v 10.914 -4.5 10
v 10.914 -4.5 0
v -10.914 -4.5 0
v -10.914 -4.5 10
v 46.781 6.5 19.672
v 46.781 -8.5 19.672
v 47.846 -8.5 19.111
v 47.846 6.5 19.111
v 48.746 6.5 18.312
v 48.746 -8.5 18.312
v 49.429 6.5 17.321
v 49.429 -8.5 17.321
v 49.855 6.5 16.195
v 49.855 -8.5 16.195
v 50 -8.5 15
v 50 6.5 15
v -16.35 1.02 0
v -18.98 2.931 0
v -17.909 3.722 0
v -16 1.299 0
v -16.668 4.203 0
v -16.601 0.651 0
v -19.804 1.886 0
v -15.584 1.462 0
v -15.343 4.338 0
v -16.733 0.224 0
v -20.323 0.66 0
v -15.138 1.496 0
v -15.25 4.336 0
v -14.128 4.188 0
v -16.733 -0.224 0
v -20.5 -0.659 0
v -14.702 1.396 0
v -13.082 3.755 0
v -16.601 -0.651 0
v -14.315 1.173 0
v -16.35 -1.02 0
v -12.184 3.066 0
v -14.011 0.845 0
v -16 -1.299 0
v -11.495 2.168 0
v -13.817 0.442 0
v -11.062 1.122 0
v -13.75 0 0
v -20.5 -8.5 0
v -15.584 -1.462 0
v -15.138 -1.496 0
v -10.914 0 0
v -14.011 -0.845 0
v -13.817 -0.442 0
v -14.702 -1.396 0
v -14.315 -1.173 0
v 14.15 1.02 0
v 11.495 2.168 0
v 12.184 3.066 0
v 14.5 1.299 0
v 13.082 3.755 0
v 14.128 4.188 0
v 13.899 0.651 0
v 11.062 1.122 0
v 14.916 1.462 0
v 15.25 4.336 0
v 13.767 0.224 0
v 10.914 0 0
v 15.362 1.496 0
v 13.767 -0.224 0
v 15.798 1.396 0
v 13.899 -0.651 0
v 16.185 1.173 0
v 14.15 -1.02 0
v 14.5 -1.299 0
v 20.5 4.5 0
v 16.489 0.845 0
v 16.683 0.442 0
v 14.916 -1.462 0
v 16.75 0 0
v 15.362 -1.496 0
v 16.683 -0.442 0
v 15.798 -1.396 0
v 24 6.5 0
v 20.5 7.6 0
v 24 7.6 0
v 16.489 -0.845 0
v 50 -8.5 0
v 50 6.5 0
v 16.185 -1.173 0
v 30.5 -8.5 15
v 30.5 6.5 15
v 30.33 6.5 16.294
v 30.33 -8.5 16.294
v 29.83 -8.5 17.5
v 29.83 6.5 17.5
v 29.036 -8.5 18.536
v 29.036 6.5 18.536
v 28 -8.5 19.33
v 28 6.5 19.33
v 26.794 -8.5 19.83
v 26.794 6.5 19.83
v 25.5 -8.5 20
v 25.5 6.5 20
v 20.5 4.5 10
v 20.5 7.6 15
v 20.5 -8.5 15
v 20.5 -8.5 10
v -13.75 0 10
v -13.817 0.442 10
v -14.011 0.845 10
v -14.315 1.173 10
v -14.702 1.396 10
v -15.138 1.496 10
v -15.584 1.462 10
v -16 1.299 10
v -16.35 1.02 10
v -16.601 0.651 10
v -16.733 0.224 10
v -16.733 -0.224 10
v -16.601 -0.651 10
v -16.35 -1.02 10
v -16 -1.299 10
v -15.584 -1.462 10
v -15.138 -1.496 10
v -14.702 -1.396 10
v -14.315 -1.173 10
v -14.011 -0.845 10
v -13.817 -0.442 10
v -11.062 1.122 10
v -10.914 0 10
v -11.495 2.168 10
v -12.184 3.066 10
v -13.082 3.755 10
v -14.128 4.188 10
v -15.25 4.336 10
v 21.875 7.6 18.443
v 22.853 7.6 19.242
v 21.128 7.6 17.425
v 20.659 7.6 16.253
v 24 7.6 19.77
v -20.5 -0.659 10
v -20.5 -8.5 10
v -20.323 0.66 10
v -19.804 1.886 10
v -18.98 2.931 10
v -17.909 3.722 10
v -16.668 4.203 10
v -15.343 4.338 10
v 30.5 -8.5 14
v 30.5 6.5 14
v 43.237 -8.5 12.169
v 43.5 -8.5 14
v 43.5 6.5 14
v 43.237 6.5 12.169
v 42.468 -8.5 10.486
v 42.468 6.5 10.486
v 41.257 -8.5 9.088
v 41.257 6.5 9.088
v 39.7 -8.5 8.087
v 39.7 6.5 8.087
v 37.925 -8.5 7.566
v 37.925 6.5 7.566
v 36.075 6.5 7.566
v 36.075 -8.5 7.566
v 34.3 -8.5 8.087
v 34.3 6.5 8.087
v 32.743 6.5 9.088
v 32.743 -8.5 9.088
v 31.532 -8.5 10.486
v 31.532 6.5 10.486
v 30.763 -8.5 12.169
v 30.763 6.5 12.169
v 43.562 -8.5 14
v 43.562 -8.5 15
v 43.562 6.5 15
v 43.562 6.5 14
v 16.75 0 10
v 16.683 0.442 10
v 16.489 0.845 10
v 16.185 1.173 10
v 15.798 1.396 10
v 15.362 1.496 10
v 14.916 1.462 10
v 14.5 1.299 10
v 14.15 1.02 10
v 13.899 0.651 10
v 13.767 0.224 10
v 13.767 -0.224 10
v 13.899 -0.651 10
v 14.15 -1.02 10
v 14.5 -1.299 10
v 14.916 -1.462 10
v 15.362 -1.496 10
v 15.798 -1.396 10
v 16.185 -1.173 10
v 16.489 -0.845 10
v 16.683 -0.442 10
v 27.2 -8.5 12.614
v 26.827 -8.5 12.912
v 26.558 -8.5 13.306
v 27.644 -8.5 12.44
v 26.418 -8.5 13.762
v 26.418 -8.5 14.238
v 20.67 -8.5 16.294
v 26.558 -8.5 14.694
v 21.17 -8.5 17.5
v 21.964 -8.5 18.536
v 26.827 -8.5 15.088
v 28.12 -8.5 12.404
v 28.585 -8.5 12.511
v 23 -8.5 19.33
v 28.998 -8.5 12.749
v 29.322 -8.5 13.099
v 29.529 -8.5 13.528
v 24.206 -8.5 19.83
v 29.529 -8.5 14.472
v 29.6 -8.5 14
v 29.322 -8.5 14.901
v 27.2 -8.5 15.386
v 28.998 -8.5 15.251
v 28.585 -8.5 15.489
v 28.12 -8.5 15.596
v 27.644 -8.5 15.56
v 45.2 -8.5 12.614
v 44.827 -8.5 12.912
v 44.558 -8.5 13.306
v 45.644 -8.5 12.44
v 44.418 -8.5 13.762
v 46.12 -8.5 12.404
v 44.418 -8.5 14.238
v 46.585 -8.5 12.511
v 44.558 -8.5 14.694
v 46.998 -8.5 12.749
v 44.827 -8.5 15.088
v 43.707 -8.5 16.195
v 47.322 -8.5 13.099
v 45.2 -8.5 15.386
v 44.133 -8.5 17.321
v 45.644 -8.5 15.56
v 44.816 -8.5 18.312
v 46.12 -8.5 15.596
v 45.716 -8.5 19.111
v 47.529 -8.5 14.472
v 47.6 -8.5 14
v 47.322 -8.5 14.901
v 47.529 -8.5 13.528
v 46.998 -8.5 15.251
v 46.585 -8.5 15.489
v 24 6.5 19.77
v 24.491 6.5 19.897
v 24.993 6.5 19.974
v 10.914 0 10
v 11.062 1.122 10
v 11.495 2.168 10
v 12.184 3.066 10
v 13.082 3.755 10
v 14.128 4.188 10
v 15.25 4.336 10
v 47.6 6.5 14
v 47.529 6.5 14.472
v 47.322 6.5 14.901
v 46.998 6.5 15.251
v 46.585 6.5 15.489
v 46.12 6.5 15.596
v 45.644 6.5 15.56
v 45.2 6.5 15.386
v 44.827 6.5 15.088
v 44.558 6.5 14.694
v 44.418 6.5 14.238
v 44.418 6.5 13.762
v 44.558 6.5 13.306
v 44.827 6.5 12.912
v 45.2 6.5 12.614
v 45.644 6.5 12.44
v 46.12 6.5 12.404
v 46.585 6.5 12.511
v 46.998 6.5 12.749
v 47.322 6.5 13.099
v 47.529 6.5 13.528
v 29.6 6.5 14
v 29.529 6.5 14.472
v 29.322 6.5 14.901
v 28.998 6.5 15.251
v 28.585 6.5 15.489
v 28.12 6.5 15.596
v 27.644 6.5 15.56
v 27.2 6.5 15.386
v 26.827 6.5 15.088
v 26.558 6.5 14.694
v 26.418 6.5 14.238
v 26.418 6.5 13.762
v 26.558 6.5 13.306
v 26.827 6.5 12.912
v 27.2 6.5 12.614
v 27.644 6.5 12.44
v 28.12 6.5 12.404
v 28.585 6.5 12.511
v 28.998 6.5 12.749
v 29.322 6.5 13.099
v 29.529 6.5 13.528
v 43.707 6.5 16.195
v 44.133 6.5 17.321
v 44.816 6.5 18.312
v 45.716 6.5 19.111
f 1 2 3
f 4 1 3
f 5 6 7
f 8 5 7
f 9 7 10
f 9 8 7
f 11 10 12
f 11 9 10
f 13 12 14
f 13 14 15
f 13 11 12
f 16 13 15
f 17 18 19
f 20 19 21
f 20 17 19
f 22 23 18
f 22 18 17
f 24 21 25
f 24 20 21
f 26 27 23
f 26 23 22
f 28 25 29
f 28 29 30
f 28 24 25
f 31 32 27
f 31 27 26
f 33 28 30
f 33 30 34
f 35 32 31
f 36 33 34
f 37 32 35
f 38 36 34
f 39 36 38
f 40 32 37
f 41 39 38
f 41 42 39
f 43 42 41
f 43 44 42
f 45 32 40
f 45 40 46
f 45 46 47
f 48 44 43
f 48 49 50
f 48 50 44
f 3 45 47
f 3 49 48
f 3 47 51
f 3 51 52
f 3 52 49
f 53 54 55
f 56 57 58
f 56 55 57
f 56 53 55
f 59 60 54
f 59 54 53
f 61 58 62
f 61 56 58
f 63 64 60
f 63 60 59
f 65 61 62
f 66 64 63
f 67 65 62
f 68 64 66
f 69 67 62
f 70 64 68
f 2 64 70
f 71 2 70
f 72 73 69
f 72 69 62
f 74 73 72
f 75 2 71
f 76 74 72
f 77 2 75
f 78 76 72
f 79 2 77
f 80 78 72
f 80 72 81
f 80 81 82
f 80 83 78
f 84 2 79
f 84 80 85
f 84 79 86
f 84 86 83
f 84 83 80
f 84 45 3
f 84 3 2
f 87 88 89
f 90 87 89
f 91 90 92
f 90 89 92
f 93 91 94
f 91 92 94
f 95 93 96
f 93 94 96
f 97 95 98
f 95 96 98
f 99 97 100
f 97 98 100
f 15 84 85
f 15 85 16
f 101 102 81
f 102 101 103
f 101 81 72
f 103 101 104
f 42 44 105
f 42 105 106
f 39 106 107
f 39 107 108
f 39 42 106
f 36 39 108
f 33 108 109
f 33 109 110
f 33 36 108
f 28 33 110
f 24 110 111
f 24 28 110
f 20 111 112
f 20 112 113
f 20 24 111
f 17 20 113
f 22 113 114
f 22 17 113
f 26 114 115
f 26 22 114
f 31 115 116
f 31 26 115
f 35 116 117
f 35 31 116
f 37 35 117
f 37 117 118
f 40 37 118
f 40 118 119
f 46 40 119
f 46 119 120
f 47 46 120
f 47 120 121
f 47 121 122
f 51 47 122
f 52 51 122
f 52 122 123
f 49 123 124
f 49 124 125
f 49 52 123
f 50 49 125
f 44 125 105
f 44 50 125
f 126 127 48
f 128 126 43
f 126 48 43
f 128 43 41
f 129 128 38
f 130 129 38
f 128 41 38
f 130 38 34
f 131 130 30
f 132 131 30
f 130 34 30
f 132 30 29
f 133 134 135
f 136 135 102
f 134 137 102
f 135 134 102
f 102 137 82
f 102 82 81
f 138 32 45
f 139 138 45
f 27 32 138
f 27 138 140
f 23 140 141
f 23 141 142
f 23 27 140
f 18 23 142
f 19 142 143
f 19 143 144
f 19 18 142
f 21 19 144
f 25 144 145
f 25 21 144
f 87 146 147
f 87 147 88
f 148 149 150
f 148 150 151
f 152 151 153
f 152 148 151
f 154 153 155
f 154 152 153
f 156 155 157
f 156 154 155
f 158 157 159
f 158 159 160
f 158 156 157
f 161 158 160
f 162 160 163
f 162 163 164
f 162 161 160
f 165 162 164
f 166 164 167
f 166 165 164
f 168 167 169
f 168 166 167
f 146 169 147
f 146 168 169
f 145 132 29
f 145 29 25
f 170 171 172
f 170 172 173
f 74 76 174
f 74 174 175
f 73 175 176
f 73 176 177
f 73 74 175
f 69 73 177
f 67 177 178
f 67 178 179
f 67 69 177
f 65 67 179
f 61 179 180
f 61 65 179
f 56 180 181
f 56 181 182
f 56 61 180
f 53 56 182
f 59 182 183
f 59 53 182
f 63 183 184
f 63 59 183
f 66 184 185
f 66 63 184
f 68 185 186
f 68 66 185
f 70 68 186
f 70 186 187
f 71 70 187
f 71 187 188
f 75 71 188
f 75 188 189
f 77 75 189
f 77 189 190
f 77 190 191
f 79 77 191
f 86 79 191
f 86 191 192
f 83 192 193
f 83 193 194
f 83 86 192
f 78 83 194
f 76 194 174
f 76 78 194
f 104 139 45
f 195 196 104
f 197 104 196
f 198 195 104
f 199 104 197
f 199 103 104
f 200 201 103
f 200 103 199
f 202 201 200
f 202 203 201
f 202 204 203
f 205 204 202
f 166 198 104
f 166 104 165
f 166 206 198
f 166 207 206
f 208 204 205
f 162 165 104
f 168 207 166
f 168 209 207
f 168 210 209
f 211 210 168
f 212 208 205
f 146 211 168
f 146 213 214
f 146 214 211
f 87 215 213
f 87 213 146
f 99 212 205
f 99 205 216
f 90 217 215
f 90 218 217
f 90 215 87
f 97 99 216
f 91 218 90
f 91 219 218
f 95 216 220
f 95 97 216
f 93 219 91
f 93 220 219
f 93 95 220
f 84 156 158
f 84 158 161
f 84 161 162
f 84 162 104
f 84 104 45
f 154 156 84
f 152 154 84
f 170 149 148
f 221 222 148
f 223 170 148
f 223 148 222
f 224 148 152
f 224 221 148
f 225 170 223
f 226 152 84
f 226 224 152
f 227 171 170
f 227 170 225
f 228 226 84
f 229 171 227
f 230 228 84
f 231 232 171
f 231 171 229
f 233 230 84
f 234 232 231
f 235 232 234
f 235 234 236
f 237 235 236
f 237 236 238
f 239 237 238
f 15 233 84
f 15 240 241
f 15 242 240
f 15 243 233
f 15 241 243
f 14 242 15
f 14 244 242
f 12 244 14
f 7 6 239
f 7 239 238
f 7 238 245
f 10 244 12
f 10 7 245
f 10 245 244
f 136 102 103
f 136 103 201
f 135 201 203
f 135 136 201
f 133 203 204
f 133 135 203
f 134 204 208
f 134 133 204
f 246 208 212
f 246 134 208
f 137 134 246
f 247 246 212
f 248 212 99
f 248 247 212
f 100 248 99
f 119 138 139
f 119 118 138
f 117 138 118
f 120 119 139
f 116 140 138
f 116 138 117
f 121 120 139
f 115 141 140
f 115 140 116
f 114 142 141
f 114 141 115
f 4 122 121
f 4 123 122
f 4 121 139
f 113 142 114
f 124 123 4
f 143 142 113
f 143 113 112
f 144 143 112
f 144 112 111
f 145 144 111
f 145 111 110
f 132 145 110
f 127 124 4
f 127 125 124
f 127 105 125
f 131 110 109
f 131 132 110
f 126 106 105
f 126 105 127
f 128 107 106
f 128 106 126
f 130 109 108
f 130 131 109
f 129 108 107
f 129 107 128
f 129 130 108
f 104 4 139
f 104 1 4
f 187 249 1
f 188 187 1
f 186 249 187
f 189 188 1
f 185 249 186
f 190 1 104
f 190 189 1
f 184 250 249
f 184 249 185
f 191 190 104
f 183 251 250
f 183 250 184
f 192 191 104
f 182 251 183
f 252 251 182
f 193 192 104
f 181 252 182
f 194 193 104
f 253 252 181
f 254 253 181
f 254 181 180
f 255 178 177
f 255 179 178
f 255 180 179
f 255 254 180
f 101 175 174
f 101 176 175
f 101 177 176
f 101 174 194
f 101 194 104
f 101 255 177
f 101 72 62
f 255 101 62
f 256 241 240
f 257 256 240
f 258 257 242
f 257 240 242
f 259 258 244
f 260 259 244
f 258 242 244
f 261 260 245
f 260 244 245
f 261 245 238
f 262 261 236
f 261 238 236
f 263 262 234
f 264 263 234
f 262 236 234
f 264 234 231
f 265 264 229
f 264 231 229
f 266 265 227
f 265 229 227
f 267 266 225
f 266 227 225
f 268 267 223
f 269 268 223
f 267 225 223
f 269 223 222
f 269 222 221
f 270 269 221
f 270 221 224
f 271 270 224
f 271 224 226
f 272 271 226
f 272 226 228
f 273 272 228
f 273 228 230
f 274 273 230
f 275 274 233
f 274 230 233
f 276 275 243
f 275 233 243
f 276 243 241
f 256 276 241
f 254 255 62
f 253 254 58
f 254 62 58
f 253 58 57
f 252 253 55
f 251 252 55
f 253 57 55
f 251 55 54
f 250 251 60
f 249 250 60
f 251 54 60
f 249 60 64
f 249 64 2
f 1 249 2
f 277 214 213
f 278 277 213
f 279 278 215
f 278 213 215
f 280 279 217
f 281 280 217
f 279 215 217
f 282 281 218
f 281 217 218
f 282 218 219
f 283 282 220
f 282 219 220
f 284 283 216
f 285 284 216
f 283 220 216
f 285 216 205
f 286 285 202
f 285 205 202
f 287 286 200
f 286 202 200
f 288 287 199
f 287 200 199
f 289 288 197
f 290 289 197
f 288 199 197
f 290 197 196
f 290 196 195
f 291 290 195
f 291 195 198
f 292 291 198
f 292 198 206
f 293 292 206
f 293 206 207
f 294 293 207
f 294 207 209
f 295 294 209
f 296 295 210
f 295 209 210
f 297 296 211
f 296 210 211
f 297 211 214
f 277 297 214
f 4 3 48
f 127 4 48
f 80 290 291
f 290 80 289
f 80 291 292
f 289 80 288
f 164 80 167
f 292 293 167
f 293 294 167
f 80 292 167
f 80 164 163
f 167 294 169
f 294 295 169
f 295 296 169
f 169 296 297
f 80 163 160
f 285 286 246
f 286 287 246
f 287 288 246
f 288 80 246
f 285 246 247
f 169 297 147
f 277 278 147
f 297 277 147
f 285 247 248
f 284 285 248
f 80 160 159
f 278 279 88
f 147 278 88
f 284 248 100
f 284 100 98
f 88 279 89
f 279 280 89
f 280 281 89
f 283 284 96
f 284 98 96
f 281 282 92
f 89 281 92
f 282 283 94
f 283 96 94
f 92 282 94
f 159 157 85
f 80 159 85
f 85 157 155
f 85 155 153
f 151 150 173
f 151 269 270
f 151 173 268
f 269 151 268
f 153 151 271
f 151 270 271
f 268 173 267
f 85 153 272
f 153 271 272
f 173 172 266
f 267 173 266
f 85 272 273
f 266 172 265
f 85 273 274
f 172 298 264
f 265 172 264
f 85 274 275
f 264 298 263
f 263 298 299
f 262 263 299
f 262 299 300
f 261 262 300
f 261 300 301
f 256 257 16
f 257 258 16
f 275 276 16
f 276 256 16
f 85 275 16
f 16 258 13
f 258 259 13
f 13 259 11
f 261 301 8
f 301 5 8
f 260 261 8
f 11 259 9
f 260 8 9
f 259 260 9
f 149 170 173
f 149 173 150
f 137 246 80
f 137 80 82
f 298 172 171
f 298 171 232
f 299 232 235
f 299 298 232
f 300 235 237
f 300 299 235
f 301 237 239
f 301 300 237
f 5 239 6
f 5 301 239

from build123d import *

# Parameters (mm, degrees)
F0_R        = 1.5
F1_DEPTH    = 10
F2_DEPTH    = 20
F4_R        = 1.6
F5_DEPTH    = 15
F6_T1_DEPTH = 40
F6_T3_DEPTH = 41.1
F6_T5_DEPTH = 35.7954738485


# Not quite as in the source:
# - a fillet or chamfer that OpenCascade refuses, or shapes differently, is made with other operations: its cross-section is extruded or revolved along the edge and cut away or added


with BuildPart() as f1:
    # F0 (on Top) → F1 (new body)
    with BuildSketch(Plane.XY):
        with BuildLine():
            Line((-15.25, 4.3355262056), (-20.5, 4.5))
            Line((-20.5, 4.5), (-20.5, -4.5))
            Line((-20.5, -4.5), (-10.9144737944, -4.5))
            Line((-10.9144737944, -4.5), (-10.9144737944, 0))
            ThreePointArc((-10.9144737944, 0), (-12.18432002, 3.06567998), (-15.25, 4.3355262056))
        make_face()
        with Locations((-15.25, 0)):
            Circle(F0_R, mode=Mode.SUBTRACT)
        Polygon((20.5, -8.5), (20.5, -4.5), (10.9144737944, -4.5), (-10.9144737944, -4.5), (-20.5, -4.5), (-20.5, -8.5), align=None)
        with BuildLine():
            Line((20.5, -4.5), (20.5, 4.5))
            Line((20.5, 4.5), (15.25, 4.3355262056))
            ThreePointArc((15.25, 4.3355262056), (12.18432002, 3.06567998), (10.9144737944, 0))
            Line((10.9144737944, 0), (10.9144737944, -4.5))
            Line((10.9144737944, -4.5), (20.5, -4.5))
        make_face()
        with Locations((15.25, 0)):
            Circle(F0_R, mode=Mode.SUBTRACT)
    extrude(amount=F1_DEPTH)


with BuildPart() as f2:
    # F0 (on Top) → F2 (new body)
    with BuildSketch(Plane.XY):
        Polygon((20.5, 7.6), (20.5, 4.5), (20.5, -4.5), (20.5, -8.5), (24, -8.5), (24, 0), (24, 7.6), align=None)
    extrude(amount=F2_DEPTH)


with BuildPart() as f1_1:
    add(f1.part)

    # F3: union F2
    add(f2.part)

    # F4 (on face) → F5 (join)
    with BuildSketch(Plane.XZ.offset(8.5)):
        with BuildLine():
            Line((24, 14), (24, 0))
            Line((24, 0), (50, 0))
            Line((50, 0), (50, 14))
            Line((50, 14), (50, 20))
            Line((50, 20), (43.5623936355, 20))
            Line((43.5623936355, 20), (43.5623936355, 14))
            Line((43.5623936355, 14), (43.5, 14))
            ThreePointArc((43.5, 14), (37, 7.5), (30.5, 14))
            Line((30.5, 14), (30.5, 20))
            Line((30.5, 20), (24, 20))
            Line((24, 20), (24, 14))
        make_face()
        with Locations((28, 14)):
            Circle(F4_R, mode=Mode.SUBTRACT)
        with Locations((46, 14)):
            Circle(F4_R, mode=Mode.SUBTRACT)
    extrude(amount=-F5_DEPTH)

    # F6: fillet of radius 5 on 5 edges, made by hand

    # F6_s2 → F6_t1 (cut)
    with BuildSketch(Plane.XZ.offset(-19)):
        with BuildLine():
            ThreePointArc((43.5623936355, 15), (45.0268597296, 18.5355339059), (48.5623936355, 20))
            Line((48.5623936355, 20), (43.5623936355, 20))
            Line((43.5623936355, 20), (43.5623936355, 15))
        make_face()
        with BuildLine():
            ThreePointArc((45, 20), (48.5355339059, 18.5355339059), (50, 15))
            Line((50, 15), (50, 20))
            Line((50, 20), (45, 20))
        make_face()
        with BuildLine():
            ThreePointArc((30.5, 15), (29.0355339059, 18.5355339059), (25.5, 20))
            Line((25.5, 20), (30.5, 20))
            Line((30.5, 20), (30.5, 15))
        make_face()
    extrude(amount=F6_T1_DEPTH, mode=Mode.SUBTRACT)

    # F6_s4 → F6_t3 (cut)
    with BuildSketch(Plane.XZ.offset(-20.1)):
        with BuildLine():
            ThreePointArc((20.5, 15), (21.9644660941, 18.5355339059), (25.5, 20))
            Line((25.5, 20), (20.5, 20))
            Line((20.5, 20), (20.5, 15))
        make_face()
    extrude(amount=F6_T3_DEPTH, mode=Mode.SUBTRACT)

    # F6_s6 → F6_t5 (cut)
    with BuildSketch(Plane.XY.offset(-12.8977369243)):
        with BuildLine():
            ThreePointArc((-20.5, -0.6590947697), (-18.9797396108, 2.9313665155), (-15.3434351037, 4.3384533725))
            Line((-15.3434351037, 4.3384533725), (-20.5, 4.5))
            Line((-20.5, 4.5), (-20.5, -0.6590947697))
        make_face()
    extrude(amount=F6_T5_DEPTH, mode=Mode.SUBTRACT)


solid = f1_1.part
